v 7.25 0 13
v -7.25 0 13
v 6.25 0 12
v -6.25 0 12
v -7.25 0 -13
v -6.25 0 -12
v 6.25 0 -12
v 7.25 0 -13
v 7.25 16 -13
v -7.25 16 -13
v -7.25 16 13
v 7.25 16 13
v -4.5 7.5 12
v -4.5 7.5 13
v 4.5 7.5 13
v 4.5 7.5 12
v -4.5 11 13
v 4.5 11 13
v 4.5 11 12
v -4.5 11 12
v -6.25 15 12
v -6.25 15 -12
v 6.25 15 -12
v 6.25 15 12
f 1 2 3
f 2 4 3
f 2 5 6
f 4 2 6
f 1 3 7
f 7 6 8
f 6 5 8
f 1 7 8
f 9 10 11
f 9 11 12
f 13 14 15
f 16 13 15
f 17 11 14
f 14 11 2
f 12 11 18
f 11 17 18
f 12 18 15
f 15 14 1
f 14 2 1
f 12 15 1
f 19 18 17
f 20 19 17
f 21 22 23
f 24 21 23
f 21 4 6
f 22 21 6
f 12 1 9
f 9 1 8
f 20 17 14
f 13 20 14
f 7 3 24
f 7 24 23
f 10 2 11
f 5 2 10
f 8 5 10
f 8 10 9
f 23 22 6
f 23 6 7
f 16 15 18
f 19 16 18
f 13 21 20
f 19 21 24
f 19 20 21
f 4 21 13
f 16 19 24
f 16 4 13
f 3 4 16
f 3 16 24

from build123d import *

# Parameters (mm, degrees)
IZIM1_W                     = 14.5
IZIM1_H                     = 26
IZIM1_W_2                   = 12.5
IZIM1_H_2                   = 24
Y_KSEKLIK_EKSTR_ZYON1_DEPTH = 15
IZIM2_W                     = 14.5
IZIM2_H                     = 26
Y_KSEKLIK_EKSTR_ZYON2_DEPTH = 1
KES_EKSTR_ZYON1_DEPTH       = 2


with BuildPart() as part:
    # Çizim1 → Yükseklik-Ekstrüzyon1 (new body)
    with BuildSketch(Plane(origin=(0, 0, 0), x_dir=(1, 0, 0), z_dir=(0, 1, 0))):
        Rectangle(IZIM1_W, IZIM1_H)
        Rectangle(IZIM1_W_2, IZIM1_H_2, mode=Mode.SUBTRACT)
    extrude(amount=Y_KSEKLIK_EKSTR_ZYON1_DEPTH)

    # Çizim2 → Yükseklik-Ekstrüzyon2 (add)
    with BuildSketch(Plane(origin=(0, 15, 0), x_dir=(1, 0, 0), z_dir=(0, 1, 0))):
        Rectangle(IZIM2_W, IZIM2_H)
    extrude(amount=Y_KSEKLIK_EKSTR_ZYON2_DEPTH)

    # Çizim3 → Kes-Ekstrüzyon1 (cut)
    with BuildSketch(Plane.XY.offset(13)):
        Polygon((4.5, 11), (0, 11), (-4.5, 11), (-4.5, 7.5), (4.5, 7.5), align=None)
    extrude(amount=-KES_EKSTR_ZYON1_DEPTH, mode=Mode.SUBTRACT)


solid = part.part
